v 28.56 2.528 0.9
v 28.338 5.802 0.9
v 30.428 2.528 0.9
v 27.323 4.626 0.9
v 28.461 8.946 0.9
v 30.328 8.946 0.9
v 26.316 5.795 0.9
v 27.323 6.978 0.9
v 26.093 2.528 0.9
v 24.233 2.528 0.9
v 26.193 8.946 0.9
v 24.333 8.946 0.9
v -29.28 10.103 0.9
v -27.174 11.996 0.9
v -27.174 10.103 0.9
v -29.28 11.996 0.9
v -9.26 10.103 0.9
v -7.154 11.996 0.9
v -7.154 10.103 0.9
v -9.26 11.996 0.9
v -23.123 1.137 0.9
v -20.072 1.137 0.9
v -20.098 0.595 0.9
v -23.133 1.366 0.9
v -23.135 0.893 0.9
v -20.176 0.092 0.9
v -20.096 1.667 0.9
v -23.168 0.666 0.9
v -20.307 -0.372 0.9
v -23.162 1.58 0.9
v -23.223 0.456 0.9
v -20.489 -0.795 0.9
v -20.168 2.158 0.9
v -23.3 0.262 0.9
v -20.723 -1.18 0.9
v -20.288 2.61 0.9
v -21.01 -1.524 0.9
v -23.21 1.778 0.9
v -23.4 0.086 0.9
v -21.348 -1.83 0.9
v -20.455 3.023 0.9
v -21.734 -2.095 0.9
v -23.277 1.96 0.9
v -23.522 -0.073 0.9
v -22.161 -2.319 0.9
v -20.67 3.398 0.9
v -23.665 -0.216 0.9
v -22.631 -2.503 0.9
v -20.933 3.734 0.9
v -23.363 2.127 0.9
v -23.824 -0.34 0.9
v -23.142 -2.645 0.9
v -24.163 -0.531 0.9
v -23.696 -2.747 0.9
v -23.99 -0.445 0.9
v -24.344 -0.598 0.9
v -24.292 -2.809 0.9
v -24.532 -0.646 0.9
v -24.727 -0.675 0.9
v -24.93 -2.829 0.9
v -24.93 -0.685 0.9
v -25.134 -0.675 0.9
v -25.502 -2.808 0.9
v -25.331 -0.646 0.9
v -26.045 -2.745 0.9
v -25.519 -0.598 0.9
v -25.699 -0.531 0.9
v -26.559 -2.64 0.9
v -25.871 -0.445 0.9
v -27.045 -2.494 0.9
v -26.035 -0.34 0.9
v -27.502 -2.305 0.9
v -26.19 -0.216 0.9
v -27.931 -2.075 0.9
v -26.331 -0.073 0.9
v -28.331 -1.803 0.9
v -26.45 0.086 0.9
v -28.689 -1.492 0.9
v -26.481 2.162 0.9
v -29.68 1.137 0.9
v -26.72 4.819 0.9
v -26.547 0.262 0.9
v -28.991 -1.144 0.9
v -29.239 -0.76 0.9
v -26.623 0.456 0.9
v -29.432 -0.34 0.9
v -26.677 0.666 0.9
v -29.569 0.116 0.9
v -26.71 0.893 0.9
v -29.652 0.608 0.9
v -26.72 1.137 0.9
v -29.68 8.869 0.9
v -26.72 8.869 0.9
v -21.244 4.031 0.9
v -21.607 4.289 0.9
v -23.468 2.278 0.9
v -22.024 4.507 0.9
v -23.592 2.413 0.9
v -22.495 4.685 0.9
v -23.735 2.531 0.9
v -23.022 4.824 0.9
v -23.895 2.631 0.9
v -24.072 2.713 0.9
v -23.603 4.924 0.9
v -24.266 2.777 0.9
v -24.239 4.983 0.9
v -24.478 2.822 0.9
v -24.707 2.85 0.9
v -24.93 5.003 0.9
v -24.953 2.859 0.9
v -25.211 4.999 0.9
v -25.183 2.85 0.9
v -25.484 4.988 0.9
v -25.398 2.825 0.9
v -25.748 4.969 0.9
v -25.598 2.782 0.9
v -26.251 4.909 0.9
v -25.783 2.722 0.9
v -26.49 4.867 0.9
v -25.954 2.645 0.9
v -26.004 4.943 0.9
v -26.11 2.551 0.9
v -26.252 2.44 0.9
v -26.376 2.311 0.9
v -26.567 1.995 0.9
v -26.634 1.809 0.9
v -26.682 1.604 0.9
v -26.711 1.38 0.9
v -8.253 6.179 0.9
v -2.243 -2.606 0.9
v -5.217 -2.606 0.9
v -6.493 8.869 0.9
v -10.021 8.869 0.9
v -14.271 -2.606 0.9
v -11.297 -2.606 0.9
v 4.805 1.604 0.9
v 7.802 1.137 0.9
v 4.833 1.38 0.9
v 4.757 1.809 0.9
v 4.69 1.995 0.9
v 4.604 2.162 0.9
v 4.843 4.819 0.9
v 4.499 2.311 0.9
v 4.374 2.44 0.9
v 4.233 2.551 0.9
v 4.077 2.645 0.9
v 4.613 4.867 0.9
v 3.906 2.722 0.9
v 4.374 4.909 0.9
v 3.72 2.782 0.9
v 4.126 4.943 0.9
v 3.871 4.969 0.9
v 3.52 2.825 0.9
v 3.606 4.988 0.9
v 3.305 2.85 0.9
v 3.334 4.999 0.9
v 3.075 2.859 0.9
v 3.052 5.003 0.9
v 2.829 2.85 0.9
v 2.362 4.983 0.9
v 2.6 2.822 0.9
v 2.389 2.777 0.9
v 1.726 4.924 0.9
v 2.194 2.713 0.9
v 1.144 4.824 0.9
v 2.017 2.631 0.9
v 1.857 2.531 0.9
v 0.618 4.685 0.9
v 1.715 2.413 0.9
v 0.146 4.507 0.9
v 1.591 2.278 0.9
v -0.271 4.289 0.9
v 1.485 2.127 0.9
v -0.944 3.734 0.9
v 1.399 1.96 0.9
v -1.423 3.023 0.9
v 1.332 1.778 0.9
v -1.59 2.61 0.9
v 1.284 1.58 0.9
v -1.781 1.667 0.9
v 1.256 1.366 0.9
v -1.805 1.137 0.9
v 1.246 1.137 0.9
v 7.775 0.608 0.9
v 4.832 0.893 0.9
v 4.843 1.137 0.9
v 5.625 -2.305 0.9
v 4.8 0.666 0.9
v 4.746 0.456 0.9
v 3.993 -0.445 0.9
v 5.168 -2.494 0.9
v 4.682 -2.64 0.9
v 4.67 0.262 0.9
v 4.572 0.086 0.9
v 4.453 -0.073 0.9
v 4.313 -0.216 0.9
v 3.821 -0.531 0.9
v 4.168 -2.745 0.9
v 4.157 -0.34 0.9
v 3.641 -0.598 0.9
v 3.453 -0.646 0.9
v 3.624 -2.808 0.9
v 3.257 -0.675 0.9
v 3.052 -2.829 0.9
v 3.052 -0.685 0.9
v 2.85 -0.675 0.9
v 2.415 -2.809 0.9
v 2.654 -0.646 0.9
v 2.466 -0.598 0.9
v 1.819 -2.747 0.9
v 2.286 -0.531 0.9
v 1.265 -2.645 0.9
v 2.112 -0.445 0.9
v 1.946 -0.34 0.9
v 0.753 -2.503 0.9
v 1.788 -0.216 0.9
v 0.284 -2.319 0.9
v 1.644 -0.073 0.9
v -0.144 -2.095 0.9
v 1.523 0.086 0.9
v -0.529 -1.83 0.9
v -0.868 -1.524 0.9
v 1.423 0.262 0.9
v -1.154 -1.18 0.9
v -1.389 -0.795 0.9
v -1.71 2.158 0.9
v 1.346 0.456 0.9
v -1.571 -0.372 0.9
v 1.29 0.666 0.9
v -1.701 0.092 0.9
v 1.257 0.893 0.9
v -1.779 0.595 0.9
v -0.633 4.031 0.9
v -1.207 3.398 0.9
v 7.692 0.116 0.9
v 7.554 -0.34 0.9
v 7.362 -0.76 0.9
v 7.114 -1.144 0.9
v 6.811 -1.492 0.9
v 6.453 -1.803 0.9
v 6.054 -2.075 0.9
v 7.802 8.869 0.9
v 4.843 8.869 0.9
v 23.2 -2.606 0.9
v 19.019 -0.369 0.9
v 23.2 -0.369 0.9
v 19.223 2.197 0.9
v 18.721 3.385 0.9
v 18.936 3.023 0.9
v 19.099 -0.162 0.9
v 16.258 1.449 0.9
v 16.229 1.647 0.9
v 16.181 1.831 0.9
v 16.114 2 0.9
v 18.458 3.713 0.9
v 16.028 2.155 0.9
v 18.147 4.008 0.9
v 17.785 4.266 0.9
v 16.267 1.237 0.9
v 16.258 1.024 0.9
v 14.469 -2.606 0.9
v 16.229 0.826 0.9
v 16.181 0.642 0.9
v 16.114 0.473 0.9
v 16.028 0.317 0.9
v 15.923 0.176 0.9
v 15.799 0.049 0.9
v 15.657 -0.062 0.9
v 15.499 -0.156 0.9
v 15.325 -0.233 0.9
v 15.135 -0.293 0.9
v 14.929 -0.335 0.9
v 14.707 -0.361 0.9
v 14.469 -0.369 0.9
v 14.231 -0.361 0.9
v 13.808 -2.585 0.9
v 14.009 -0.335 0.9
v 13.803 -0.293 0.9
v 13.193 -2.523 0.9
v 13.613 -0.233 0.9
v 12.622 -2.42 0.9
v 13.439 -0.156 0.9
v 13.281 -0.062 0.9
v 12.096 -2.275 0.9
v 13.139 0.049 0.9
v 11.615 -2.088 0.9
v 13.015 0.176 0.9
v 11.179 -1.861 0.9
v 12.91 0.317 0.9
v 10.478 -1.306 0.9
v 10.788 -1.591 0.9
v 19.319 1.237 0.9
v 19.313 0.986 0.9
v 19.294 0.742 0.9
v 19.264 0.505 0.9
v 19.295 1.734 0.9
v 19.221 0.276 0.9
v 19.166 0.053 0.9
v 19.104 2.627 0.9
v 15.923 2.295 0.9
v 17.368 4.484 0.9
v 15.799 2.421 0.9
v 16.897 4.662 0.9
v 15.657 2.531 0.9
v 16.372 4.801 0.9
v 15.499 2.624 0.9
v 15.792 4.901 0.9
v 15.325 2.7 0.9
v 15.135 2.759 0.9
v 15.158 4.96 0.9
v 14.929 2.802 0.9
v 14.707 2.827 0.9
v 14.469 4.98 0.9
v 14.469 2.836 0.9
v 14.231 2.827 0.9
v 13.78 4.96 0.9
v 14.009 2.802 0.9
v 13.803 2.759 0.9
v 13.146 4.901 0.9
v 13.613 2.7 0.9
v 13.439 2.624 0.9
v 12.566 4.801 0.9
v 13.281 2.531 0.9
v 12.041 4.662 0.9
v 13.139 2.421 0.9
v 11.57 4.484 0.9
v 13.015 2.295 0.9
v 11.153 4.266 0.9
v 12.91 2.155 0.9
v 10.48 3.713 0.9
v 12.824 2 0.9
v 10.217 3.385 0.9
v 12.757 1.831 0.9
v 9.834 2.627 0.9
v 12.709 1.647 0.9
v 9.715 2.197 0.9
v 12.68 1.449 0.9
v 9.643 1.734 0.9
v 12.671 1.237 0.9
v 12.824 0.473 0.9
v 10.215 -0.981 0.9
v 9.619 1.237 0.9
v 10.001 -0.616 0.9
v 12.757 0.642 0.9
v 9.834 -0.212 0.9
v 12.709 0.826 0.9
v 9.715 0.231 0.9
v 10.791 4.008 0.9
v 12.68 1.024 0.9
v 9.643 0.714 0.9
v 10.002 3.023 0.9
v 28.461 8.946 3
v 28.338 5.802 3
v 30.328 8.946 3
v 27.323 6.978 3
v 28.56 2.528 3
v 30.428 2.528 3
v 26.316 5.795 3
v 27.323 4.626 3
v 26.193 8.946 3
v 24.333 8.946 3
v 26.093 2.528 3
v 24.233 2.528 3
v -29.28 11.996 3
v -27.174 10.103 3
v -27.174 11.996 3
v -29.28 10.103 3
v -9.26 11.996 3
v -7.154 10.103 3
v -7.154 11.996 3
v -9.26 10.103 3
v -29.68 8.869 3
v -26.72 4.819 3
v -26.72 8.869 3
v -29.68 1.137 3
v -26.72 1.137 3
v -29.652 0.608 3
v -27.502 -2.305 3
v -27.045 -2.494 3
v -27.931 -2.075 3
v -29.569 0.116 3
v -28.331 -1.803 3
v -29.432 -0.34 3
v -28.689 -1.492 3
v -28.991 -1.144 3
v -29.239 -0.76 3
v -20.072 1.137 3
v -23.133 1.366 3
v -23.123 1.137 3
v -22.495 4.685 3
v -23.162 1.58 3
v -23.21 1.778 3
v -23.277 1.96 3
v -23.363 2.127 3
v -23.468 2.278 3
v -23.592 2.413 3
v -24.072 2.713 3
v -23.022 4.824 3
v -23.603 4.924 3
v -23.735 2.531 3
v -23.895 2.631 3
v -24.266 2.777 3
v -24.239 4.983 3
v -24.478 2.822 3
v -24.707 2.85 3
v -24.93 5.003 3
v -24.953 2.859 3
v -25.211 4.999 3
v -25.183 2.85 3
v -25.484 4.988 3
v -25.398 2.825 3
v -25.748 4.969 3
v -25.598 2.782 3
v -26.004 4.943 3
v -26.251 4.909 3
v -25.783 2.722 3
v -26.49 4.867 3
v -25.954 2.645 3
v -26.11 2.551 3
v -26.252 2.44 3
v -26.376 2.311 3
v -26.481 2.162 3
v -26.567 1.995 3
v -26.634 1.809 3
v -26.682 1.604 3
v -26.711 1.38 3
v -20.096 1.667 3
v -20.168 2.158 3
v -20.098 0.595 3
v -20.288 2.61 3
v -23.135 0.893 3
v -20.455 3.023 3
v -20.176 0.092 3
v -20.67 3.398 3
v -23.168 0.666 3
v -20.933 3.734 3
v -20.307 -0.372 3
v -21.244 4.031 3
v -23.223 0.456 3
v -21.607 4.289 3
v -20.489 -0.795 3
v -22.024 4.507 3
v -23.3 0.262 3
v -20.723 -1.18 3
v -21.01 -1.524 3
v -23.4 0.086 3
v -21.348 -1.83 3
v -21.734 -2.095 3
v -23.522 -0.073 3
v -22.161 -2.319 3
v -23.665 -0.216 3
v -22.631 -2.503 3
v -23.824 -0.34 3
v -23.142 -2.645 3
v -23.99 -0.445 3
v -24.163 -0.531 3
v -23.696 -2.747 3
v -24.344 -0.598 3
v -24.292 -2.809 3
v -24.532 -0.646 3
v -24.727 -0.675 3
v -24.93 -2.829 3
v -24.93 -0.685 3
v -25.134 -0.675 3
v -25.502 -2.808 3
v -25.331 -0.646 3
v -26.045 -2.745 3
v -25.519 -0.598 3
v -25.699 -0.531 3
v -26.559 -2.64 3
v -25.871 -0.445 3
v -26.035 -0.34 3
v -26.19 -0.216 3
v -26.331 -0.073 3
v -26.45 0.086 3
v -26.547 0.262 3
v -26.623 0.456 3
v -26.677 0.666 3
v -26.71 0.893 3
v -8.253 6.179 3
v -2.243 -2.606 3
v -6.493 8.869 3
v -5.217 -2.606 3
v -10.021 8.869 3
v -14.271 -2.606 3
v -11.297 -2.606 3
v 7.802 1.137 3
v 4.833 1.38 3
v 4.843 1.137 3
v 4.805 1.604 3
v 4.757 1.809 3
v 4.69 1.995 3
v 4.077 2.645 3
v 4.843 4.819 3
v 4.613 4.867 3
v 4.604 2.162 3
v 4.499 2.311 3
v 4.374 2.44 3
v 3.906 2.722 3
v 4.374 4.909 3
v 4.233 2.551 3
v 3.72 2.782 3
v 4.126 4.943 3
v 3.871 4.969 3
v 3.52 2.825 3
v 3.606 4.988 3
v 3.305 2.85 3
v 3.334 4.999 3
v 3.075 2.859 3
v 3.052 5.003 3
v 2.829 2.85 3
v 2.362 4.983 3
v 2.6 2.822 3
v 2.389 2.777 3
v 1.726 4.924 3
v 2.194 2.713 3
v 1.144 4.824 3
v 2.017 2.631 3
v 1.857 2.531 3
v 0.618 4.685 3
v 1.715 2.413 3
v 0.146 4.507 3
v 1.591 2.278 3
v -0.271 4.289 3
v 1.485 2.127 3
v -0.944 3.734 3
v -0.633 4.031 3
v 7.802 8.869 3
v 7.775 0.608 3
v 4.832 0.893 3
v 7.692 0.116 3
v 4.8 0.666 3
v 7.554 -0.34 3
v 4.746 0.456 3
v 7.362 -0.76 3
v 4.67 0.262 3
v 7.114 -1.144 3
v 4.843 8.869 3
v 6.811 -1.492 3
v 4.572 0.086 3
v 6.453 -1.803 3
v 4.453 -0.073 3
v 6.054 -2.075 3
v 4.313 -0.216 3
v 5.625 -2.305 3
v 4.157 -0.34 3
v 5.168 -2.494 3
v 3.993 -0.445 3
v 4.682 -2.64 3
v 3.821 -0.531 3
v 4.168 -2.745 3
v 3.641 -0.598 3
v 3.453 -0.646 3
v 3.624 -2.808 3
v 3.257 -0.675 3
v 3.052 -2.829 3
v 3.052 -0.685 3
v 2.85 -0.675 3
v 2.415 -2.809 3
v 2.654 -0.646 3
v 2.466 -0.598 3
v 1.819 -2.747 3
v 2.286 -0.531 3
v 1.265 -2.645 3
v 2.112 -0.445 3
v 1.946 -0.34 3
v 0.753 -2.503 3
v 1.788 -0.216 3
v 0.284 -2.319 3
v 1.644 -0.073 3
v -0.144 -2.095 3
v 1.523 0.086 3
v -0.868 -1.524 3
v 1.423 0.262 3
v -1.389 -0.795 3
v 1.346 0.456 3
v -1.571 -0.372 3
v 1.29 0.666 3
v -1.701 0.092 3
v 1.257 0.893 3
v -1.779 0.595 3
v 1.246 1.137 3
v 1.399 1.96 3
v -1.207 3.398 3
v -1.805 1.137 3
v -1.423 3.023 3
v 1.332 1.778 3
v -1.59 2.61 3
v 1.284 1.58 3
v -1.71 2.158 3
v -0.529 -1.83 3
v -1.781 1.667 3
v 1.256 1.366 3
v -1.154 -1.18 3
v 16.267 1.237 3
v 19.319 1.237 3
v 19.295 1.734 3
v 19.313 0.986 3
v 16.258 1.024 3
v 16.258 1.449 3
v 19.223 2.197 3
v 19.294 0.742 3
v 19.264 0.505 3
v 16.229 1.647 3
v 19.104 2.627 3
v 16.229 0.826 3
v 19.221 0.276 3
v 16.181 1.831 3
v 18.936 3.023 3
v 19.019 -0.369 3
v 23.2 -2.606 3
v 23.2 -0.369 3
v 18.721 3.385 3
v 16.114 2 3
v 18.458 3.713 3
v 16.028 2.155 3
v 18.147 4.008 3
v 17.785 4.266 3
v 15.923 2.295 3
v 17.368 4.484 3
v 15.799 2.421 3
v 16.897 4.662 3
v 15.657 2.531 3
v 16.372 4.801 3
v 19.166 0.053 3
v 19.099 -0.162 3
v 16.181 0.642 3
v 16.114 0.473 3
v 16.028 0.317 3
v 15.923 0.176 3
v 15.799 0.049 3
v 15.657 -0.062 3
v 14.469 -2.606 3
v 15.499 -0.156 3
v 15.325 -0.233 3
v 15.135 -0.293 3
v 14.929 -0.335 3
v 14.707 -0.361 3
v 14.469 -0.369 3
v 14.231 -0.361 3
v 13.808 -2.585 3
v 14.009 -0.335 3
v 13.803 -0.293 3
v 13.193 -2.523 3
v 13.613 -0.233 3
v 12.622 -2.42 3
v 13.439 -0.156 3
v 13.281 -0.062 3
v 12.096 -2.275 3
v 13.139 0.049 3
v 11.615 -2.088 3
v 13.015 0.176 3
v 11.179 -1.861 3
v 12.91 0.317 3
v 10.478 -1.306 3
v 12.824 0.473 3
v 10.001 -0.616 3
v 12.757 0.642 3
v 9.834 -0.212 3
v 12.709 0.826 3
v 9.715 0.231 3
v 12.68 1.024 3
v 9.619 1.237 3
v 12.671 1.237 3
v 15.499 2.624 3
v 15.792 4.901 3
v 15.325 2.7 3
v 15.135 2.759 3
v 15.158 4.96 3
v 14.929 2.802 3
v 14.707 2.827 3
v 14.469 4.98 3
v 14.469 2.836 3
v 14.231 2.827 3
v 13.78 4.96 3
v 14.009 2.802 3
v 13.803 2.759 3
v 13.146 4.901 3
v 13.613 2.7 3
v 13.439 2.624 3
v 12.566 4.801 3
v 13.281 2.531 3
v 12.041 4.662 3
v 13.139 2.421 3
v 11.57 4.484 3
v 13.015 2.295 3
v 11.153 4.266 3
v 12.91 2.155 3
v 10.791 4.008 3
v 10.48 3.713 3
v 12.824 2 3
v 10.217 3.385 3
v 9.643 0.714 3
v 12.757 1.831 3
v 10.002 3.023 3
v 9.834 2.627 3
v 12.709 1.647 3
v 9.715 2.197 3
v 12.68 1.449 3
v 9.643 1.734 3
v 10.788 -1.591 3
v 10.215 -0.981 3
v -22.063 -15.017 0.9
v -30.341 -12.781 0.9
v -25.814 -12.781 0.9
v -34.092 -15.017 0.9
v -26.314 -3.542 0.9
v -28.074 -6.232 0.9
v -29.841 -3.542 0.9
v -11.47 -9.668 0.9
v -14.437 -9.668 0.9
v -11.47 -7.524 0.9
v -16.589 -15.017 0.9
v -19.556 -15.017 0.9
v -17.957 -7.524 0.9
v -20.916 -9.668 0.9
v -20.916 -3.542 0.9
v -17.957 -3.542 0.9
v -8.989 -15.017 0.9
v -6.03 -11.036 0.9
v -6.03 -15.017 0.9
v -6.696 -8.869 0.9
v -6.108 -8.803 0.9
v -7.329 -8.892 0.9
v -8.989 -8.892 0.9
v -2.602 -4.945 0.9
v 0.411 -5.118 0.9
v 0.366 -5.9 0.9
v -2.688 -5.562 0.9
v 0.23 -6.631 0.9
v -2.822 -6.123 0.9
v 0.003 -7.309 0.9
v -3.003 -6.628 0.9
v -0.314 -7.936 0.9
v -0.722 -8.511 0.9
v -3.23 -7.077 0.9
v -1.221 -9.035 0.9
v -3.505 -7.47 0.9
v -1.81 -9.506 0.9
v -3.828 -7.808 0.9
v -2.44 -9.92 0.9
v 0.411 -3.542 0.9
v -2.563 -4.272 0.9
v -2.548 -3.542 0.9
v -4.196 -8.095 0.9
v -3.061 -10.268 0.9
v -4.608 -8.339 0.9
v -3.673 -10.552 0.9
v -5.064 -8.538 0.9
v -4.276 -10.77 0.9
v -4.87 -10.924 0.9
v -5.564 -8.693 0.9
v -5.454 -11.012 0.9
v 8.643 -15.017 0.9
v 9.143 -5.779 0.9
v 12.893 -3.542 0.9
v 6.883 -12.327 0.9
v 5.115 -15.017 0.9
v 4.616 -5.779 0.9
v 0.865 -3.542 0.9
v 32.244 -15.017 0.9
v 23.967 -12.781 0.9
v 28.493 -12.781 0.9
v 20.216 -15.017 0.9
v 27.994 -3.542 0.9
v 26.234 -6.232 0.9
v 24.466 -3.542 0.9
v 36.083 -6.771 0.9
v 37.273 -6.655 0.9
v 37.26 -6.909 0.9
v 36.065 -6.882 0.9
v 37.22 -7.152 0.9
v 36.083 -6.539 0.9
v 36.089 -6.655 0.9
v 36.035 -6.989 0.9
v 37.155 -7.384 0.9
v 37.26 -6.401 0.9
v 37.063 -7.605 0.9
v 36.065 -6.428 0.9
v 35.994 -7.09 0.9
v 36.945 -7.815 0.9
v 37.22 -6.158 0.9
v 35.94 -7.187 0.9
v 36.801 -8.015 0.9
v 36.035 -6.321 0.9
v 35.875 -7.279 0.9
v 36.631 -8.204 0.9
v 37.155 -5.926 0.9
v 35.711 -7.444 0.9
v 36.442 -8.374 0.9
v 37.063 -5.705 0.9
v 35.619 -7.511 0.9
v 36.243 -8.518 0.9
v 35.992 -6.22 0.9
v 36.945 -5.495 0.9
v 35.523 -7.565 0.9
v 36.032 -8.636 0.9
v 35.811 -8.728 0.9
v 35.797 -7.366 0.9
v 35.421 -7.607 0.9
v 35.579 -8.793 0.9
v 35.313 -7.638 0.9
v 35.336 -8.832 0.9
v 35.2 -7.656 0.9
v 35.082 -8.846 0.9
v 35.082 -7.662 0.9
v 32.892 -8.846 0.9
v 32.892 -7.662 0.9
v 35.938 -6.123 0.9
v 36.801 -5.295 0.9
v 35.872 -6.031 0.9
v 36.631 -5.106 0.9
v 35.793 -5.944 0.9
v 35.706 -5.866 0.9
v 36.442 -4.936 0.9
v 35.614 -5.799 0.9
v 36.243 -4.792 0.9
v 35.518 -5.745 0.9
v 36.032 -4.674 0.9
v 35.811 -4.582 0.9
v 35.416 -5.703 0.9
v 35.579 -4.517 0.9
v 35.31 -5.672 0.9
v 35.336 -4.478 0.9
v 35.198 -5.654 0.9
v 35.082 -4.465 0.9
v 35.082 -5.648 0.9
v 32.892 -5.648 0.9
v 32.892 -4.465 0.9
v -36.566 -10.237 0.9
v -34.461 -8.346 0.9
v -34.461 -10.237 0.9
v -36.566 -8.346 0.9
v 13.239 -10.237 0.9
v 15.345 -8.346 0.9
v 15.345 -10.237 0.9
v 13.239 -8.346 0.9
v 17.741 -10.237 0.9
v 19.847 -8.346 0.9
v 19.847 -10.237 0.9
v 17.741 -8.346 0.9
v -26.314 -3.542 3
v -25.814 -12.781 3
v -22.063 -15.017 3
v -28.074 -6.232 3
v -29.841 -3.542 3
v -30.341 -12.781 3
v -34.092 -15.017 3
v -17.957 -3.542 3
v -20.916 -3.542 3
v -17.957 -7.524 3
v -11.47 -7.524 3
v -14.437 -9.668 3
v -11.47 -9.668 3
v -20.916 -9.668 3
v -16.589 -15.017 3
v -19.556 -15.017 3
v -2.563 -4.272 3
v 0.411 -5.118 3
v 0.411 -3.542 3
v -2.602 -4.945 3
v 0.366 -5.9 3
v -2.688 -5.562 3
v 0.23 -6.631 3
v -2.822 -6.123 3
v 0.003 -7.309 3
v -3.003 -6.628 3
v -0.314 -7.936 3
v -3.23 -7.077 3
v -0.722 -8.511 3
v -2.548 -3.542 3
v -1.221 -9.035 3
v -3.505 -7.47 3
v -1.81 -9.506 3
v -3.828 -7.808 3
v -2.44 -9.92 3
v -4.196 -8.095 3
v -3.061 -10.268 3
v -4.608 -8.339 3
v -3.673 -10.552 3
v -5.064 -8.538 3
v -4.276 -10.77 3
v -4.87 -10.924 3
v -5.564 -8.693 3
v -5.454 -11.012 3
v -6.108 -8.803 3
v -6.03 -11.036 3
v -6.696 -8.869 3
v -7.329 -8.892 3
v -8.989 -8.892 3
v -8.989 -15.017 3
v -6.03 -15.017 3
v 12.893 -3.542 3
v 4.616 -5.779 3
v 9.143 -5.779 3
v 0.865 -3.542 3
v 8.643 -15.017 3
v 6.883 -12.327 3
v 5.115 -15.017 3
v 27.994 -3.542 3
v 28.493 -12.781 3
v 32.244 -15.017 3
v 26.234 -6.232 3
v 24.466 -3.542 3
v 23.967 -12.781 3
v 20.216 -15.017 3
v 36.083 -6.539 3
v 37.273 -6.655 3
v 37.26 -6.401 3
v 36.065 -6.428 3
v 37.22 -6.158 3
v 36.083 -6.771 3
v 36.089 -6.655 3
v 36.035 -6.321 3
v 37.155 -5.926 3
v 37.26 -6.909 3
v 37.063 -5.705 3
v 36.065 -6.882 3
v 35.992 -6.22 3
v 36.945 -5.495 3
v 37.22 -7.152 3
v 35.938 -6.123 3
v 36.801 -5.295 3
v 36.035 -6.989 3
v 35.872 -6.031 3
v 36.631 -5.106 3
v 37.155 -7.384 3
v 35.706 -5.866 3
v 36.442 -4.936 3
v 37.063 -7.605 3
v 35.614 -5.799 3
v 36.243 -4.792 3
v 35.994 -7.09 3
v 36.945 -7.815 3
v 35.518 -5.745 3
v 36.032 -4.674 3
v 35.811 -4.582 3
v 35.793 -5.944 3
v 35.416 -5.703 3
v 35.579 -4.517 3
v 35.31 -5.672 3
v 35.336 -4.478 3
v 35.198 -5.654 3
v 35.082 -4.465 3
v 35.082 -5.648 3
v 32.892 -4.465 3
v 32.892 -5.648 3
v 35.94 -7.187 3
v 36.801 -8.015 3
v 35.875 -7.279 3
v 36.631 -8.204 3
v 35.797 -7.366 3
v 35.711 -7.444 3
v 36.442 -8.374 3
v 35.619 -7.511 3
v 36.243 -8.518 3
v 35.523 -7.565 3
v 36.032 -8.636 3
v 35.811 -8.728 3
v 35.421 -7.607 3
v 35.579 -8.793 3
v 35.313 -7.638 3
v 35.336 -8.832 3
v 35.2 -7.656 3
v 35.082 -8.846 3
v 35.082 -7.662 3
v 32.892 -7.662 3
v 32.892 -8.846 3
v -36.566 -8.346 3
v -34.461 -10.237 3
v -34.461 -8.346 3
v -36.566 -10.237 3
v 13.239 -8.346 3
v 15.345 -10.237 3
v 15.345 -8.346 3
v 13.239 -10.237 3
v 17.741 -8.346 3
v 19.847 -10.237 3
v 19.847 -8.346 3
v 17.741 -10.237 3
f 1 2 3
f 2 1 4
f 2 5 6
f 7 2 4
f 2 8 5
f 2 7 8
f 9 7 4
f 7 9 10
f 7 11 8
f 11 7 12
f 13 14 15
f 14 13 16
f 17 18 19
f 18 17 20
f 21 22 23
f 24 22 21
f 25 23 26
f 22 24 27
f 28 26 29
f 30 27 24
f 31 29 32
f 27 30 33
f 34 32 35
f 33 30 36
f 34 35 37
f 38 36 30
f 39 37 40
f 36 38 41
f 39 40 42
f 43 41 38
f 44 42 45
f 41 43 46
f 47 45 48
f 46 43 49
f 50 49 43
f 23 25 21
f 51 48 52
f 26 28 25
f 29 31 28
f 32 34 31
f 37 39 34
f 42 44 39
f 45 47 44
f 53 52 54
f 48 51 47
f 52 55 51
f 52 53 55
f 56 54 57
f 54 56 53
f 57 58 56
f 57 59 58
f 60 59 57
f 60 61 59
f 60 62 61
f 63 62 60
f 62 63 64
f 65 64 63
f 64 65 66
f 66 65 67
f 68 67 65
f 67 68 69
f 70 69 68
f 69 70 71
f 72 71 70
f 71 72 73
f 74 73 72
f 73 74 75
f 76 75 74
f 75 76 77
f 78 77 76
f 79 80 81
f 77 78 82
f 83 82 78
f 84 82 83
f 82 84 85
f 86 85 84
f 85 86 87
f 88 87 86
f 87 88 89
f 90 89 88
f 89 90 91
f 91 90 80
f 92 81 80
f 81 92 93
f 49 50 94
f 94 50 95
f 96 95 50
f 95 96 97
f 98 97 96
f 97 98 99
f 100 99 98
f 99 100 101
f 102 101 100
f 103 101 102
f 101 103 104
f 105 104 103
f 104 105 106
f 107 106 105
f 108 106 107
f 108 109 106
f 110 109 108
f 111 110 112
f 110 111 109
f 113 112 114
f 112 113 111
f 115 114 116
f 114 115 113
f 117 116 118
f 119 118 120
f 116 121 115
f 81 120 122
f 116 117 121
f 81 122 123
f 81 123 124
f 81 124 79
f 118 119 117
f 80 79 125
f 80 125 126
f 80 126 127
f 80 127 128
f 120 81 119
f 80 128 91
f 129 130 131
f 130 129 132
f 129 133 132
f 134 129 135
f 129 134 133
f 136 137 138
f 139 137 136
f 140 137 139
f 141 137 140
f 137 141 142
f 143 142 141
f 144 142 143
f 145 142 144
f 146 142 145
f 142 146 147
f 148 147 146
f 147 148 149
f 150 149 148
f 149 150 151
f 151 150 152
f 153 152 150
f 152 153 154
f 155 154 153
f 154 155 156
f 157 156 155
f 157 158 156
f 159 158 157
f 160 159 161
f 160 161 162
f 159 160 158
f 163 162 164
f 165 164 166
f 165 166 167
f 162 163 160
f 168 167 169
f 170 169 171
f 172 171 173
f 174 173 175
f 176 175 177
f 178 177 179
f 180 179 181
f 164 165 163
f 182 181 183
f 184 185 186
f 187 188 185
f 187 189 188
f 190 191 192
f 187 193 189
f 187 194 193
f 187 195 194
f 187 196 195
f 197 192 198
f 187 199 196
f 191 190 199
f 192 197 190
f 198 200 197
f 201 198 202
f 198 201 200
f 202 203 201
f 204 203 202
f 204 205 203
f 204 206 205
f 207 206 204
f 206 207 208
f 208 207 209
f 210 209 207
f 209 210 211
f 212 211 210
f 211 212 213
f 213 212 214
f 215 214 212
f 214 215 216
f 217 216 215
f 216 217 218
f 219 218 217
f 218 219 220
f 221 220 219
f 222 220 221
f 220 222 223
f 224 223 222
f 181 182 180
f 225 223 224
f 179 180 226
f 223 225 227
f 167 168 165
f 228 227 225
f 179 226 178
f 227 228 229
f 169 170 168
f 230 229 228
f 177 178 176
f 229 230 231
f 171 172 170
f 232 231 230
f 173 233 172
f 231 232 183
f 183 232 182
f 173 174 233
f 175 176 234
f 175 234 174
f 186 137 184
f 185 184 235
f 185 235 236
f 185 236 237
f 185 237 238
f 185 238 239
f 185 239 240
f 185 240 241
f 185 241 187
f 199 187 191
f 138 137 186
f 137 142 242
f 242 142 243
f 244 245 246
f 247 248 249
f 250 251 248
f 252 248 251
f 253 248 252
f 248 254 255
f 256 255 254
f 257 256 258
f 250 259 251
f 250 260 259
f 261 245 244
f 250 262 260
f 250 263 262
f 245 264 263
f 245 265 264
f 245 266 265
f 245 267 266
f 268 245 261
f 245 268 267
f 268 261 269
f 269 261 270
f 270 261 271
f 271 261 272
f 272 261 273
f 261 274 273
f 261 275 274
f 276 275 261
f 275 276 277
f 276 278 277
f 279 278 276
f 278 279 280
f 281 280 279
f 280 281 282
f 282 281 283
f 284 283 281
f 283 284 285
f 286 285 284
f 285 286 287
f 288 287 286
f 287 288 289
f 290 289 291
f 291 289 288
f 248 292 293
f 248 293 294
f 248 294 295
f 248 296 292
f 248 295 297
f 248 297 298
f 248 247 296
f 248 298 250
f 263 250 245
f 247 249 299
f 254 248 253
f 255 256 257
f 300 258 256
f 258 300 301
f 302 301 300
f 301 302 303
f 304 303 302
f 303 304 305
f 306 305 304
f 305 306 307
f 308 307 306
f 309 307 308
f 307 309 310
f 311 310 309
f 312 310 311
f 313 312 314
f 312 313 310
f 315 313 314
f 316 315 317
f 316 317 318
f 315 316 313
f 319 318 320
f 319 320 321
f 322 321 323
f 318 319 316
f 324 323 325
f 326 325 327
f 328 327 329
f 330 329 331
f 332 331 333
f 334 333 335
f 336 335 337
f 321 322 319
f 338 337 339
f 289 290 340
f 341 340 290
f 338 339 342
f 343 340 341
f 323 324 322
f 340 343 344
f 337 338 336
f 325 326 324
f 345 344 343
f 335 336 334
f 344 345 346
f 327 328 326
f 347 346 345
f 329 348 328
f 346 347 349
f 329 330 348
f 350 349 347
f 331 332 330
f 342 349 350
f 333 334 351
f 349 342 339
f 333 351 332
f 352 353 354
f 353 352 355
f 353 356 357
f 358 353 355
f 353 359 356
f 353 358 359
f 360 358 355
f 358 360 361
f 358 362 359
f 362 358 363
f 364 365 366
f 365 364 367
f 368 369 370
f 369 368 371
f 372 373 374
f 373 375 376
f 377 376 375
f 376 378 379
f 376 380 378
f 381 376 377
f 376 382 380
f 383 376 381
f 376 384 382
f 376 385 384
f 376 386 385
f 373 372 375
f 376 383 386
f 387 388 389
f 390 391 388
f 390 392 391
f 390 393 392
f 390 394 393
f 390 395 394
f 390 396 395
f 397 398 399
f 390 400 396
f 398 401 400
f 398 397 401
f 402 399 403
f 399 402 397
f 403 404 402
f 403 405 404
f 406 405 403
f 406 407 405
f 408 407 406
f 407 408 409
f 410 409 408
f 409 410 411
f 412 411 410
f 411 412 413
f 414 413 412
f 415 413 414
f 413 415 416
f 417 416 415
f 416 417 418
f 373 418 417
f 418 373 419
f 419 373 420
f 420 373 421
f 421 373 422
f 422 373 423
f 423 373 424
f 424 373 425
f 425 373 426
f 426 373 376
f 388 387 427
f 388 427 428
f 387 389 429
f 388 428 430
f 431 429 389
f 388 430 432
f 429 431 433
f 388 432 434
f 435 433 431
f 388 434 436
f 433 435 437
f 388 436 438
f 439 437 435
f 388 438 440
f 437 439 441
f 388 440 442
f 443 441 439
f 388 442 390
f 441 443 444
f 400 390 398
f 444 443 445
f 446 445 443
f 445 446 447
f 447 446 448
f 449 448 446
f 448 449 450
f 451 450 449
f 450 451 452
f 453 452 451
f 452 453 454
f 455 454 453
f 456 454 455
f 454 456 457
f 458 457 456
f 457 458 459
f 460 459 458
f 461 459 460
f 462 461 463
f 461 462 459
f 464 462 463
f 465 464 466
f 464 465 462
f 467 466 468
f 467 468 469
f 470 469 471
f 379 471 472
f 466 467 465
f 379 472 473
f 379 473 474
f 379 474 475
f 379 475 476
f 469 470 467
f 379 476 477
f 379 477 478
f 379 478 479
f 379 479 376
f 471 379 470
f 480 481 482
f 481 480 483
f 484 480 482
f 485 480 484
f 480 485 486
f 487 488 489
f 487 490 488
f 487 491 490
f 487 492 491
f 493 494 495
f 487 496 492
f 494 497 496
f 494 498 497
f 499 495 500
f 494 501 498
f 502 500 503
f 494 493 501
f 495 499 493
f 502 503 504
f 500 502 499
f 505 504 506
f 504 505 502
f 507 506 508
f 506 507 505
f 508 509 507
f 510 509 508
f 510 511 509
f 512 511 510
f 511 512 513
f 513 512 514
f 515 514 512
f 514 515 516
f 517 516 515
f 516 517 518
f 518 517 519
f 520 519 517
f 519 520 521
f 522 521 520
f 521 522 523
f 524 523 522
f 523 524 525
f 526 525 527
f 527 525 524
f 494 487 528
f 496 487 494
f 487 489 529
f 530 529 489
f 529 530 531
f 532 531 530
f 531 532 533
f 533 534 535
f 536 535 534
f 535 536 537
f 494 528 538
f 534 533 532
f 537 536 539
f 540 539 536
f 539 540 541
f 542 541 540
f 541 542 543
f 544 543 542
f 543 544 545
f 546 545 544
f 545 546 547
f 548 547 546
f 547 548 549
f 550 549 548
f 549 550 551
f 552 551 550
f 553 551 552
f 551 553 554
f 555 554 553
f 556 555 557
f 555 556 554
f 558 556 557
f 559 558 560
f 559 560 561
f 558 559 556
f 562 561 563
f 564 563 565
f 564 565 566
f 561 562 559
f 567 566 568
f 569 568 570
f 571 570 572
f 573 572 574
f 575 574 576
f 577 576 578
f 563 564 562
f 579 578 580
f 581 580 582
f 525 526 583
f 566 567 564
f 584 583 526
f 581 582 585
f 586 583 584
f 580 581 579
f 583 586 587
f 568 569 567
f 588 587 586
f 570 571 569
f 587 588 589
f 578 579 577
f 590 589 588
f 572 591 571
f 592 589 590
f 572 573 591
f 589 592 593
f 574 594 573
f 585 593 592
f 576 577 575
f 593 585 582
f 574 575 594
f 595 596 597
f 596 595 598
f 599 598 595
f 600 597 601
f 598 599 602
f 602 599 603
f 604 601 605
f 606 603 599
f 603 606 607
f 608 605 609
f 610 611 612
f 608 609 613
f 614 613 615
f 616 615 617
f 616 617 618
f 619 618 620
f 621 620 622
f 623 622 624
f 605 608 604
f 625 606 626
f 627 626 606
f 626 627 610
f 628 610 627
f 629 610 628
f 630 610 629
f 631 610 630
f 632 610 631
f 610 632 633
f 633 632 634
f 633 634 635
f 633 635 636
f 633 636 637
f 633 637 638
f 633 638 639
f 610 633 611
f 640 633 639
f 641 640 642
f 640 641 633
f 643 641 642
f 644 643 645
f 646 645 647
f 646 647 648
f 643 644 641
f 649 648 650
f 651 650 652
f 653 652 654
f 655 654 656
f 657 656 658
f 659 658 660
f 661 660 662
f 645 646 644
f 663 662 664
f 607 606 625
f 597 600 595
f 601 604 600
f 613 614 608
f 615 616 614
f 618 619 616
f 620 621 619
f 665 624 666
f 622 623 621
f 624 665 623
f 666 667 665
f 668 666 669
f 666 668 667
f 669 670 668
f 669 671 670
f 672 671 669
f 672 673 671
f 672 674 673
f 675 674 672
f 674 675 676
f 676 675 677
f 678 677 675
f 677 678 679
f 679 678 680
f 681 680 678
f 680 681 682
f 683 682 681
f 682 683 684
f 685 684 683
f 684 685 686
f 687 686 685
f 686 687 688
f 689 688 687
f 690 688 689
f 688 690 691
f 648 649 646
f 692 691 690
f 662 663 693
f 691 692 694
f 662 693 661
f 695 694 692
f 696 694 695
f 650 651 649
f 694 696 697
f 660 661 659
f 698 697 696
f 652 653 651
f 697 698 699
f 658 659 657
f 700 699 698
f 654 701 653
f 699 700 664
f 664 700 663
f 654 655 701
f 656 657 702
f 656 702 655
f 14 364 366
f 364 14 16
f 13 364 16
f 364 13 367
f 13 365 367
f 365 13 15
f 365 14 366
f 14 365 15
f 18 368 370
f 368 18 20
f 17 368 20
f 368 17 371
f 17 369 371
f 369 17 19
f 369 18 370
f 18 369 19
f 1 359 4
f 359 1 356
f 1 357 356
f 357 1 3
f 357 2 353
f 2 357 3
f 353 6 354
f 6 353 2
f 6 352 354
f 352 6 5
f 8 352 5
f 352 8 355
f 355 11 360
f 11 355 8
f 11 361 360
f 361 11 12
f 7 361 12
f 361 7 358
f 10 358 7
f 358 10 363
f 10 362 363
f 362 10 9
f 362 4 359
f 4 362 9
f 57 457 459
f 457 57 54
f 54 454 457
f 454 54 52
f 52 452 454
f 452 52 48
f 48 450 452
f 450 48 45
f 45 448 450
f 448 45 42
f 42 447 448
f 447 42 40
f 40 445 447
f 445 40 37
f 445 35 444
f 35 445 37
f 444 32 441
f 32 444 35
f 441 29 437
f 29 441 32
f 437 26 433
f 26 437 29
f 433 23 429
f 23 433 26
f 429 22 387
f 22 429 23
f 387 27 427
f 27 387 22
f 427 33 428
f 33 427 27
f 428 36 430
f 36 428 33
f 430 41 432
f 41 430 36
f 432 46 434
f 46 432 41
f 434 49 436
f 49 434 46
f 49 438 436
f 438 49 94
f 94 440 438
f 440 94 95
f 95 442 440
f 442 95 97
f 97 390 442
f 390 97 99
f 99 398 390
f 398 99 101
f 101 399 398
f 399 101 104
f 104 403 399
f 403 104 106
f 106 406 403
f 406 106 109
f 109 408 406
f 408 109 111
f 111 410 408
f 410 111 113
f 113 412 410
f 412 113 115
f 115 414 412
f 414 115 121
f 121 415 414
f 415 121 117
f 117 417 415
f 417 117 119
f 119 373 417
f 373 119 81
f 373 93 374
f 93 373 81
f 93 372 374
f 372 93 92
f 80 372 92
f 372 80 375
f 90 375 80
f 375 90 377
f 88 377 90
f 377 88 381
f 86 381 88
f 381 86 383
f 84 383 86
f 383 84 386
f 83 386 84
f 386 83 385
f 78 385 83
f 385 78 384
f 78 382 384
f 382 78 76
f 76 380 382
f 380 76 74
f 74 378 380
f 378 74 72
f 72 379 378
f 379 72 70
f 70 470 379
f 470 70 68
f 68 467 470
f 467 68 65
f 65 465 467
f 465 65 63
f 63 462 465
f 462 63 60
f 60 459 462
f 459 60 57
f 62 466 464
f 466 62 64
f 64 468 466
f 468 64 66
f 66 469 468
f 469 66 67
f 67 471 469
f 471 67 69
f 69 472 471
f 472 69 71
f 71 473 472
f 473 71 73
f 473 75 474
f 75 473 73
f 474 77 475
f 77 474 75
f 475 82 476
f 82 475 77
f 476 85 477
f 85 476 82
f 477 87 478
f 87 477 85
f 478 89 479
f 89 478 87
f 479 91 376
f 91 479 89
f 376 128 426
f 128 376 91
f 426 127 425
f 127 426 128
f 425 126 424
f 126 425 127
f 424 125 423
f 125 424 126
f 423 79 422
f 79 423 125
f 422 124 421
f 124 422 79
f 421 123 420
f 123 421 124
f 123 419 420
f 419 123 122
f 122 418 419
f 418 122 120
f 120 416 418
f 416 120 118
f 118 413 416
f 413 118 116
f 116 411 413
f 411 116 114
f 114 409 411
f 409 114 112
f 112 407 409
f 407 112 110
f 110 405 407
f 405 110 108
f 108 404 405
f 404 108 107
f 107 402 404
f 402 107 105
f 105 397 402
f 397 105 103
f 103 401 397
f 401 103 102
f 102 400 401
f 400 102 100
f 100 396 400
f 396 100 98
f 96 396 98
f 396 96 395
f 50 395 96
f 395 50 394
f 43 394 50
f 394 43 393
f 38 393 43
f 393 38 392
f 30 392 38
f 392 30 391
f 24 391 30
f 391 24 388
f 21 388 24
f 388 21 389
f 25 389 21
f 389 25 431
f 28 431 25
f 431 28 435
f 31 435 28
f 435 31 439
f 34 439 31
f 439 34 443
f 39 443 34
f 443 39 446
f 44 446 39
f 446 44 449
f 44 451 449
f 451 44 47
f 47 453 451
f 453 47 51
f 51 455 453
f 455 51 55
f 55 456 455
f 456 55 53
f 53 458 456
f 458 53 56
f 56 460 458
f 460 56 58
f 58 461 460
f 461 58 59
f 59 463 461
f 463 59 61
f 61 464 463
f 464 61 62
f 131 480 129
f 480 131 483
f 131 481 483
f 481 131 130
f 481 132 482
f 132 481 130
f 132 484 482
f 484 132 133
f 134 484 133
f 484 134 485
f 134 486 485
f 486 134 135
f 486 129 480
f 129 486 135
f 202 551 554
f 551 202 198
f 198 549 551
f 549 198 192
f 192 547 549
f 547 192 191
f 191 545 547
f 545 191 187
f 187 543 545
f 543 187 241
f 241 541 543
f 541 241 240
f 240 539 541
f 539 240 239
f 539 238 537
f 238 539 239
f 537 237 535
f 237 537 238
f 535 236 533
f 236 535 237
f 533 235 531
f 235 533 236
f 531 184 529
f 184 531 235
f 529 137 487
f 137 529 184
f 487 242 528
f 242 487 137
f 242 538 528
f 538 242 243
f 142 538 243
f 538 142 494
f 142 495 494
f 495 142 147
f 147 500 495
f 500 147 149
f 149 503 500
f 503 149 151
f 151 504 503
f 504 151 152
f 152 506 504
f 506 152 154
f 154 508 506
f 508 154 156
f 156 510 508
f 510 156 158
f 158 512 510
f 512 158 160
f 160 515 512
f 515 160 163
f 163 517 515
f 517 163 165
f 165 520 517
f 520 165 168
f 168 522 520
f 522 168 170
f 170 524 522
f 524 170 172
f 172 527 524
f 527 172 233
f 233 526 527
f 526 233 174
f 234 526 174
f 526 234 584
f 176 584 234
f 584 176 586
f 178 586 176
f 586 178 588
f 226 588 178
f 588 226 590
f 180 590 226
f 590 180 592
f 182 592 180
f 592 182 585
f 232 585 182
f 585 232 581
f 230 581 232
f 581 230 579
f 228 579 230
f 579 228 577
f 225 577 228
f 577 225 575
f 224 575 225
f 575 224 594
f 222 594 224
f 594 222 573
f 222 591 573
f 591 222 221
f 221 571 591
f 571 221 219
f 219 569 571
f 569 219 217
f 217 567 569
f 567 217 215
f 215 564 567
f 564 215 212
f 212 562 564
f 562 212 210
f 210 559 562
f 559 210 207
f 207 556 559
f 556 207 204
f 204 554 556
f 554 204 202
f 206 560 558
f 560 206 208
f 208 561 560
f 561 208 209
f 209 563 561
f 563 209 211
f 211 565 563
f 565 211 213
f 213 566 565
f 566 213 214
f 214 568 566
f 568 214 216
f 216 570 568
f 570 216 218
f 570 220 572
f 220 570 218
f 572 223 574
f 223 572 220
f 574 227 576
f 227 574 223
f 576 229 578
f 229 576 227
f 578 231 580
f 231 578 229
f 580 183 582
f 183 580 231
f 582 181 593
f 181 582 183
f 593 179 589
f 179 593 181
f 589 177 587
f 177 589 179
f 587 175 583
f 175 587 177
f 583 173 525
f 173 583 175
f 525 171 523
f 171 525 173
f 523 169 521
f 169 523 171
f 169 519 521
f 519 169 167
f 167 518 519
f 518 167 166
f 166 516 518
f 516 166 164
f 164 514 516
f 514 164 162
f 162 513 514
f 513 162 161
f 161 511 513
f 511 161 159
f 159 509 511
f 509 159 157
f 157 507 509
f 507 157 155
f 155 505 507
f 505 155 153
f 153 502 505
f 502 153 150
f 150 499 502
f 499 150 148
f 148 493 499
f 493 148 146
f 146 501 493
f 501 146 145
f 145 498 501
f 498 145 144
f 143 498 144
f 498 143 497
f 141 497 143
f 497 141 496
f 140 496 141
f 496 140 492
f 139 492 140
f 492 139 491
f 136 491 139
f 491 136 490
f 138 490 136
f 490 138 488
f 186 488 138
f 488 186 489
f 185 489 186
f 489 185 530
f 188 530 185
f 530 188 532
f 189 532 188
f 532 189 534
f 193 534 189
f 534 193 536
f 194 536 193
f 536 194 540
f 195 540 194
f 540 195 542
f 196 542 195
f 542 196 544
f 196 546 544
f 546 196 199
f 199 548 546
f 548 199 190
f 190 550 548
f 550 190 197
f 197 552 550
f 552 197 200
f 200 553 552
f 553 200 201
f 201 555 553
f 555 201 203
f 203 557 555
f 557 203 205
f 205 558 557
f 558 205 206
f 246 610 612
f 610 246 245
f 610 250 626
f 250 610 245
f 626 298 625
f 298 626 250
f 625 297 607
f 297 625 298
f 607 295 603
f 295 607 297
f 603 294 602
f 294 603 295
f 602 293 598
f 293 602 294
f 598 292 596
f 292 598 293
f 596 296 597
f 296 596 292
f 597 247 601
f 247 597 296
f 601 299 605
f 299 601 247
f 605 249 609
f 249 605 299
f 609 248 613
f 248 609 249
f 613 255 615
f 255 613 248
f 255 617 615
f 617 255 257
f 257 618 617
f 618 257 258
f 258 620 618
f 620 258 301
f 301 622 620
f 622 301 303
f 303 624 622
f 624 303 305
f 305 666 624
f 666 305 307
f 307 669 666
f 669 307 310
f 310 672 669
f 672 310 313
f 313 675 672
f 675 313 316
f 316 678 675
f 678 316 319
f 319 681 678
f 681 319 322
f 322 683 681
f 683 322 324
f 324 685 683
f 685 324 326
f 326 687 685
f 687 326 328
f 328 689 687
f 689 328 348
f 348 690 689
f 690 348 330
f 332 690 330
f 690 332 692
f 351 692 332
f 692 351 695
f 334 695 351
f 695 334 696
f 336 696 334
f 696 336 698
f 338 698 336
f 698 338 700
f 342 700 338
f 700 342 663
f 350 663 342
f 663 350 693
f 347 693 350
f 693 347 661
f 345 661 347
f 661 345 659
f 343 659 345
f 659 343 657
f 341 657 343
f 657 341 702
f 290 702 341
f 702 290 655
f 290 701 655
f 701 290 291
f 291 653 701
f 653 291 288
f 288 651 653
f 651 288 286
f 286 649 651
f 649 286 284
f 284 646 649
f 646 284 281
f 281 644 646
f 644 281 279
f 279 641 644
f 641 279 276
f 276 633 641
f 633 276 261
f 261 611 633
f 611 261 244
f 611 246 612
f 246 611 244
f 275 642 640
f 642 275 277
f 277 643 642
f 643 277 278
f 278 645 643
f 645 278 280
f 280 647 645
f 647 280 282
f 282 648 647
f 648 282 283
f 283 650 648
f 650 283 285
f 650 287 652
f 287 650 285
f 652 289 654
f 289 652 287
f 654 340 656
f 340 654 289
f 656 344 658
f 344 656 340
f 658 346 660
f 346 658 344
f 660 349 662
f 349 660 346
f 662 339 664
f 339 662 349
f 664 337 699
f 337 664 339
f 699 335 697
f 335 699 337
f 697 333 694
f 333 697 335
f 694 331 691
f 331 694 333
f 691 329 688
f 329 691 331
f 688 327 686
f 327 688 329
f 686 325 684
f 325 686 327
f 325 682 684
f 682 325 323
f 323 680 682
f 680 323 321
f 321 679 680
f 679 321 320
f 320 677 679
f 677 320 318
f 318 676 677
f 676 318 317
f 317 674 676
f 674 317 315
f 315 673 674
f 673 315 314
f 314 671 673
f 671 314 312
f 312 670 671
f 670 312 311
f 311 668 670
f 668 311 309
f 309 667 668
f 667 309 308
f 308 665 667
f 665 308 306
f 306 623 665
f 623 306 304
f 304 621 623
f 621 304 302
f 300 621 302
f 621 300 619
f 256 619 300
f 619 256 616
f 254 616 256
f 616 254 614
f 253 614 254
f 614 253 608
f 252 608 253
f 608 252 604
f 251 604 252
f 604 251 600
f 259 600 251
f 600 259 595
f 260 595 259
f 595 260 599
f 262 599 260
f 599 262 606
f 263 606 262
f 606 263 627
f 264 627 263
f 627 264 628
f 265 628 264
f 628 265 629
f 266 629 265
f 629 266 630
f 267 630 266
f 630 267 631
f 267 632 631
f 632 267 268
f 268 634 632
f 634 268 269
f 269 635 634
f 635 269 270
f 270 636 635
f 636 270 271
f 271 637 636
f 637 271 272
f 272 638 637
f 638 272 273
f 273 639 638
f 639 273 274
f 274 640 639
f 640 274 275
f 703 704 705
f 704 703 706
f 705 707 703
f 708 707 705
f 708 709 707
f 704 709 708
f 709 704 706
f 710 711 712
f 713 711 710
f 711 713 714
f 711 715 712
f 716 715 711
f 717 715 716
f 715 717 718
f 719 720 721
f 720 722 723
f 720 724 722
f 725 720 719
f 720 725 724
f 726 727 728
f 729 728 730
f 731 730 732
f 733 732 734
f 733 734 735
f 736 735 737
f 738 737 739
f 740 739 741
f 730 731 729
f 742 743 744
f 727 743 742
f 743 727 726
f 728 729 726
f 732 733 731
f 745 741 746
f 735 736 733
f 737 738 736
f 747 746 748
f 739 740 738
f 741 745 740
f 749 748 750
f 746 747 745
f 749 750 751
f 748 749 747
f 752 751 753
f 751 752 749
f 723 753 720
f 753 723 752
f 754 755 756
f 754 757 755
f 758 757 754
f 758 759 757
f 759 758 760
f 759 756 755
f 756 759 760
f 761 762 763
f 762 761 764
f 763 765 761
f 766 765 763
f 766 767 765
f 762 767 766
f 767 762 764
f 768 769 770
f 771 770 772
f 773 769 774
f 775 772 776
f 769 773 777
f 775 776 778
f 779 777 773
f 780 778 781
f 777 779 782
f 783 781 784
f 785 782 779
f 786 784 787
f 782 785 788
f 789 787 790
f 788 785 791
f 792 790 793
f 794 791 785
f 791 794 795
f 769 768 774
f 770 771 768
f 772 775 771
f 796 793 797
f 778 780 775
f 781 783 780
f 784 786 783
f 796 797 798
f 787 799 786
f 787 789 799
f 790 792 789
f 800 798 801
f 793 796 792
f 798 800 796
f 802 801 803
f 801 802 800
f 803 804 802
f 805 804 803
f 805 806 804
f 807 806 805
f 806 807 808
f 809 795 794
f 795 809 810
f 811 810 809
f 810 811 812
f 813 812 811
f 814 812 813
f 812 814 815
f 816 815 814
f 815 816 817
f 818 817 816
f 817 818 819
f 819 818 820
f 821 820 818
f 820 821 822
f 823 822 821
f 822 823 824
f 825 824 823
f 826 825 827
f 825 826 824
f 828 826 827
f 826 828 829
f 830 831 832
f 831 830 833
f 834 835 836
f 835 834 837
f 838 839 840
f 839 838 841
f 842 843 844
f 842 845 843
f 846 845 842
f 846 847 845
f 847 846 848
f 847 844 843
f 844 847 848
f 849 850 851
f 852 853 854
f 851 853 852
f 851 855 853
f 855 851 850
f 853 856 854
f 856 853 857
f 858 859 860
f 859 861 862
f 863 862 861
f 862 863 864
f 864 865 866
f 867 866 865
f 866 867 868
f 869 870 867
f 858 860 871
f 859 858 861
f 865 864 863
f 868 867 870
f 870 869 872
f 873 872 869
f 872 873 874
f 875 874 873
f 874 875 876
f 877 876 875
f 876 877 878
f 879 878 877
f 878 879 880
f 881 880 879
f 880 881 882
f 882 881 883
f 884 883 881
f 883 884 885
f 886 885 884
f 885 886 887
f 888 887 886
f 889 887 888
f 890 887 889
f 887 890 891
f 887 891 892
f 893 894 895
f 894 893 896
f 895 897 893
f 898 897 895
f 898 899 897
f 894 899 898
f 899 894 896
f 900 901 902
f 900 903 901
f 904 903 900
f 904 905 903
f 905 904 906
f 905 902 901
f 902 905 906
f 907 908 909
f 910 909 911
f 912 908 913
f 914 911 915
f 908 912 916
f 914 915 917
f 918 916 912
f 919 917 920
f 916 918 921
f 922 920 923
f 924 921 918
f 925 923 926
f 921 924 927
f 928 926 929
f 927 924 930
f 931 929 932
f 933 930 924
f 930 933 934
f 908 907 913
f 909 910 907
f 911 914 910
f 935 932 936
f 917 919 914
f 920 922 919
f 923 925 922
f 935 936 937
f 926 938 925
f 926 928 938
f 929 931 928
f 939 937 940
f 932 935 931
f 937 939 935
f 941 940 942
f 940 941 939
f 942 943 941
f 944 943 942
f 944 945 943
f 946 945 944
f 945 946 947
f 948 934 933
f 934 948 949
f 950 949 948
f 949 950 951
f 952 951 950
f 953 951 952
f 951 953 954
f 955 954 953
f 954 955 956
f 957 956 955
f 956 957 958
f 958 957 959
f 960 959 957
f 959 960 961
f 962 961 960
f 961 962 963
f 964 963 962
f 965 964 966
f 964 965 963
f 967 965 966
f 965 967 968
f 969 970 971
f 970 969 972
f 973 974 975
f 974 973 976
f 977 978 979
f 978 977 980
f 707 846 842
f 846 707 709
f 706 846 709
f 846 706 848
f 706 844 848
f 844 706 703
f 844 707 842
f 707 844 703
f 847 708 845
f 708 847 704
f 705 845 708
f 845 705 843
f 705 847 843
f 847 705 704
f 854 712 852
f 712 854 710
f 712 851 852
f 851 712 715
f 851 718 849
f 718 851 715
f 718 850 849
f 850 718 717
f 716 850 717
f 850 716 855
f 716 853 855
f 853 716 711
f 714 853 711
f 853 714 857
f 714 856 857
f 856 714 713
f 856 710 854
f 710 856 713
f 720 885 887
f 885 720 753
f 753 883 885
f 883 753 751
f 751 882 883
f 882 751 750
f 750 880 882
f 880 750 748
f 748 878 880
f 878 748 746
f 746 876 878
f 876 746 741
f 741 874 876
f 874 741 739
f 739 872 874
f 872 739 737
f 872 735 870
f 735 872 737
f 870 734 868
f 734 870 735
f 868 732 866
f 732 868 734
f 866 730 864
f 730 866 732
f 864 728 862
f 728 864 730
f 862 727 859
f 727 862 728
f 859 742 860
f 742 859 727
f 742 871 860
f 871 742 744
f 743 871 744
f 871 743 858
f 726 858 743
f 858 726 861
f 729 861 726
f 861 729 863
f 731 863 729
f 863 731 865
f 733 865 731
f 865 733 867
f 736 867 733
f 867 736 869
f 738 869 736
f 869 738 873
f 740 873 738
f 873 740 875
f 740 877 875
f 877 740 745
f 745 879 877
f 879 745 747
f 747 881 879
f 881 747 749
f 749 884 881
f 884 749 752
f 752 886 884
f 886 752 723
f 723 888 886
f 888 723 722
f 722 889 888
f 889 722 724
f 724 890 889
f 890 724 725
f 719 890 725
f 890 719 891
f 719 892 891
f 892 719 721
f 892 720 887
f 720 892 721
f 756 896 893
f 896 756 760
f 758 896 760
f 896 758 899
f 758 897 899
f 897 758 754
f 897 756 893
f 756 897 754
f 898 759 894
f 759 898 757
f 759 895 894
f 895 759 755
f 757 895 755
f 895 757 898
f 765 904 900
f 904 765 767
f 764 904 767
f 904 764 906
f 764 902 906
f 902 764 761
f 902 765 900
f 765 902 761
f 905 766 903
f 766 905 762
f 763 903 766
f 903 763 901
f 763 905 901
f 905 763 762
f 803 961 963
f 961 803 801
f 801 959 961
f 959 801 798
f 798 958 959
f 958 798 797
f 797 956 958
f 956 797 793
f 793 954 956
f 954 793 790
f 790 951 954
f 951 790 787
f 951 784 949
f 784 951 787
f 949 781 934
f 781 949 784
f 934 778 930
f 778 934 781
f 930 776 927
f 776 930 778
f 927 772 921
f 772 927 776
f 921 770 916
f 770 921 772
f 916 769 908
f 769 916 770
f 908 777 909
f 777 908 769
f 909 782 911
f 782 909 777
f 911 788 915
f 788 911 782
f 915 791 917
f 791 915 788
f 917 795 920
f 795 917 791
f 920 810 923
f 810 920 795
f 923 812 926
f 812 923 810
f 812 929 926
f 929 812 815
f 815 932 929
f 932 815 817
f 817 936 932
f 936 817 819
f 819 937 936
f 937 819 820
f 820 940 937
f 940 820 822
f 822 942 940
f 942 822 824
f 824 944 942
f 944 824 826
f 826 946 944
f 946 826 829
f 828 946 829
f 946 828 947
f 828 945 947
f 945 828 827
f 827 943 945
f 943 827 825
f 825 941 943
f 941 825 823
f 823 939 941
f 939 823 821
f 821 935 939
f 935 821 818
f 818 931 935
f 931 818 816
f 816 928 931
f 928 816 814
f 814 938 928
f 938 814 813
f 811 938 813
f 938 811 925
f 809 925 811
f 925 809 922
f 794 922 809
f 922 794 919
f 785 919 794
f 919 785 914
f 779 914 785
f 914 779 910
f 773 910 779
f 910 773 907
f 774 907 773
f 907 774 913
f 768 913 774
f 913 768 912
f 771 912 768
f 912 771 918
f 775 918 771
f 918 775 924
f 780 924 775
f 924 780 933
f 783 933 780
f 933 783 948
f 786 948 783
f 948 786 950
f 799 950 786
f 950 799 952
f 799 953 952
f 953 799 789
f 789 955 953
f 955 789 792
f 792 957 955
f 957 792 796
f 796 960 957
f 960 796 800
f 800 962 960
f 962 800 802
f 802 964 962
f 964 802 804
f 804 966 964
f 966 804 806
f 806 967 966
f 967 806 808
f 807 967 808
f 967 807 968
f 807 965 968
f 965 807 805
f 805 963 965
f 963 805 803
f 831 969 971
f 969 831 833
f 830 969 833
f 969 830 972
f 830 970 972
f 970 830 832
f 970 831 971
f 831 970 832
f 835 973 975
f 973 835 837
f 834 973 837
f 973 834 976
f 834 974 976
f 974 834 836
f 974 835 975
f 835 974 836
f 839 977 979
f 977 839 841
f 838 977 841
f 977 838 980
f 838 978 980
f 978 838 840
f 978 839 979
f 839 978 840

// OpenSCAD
$fn = 48;
  // syllabics (overlaid on icon, tallest)
  translate([0, 4.414, 0.900]) linear_extrude(height=2.100) text("ᑳ ᐲᑯᓇᕽ", size=11.334, halign="center", valign="center", font="Euphemia UCAS:style=Bold");
  translate([0, -9.414, 0.900]) linear_extrude(height=2.100) text("ᐎᔭᓯᐍᐎᐣ", size=11.334, halign="center", valign="center", font="Euphemia UCAS:style=Bold");
